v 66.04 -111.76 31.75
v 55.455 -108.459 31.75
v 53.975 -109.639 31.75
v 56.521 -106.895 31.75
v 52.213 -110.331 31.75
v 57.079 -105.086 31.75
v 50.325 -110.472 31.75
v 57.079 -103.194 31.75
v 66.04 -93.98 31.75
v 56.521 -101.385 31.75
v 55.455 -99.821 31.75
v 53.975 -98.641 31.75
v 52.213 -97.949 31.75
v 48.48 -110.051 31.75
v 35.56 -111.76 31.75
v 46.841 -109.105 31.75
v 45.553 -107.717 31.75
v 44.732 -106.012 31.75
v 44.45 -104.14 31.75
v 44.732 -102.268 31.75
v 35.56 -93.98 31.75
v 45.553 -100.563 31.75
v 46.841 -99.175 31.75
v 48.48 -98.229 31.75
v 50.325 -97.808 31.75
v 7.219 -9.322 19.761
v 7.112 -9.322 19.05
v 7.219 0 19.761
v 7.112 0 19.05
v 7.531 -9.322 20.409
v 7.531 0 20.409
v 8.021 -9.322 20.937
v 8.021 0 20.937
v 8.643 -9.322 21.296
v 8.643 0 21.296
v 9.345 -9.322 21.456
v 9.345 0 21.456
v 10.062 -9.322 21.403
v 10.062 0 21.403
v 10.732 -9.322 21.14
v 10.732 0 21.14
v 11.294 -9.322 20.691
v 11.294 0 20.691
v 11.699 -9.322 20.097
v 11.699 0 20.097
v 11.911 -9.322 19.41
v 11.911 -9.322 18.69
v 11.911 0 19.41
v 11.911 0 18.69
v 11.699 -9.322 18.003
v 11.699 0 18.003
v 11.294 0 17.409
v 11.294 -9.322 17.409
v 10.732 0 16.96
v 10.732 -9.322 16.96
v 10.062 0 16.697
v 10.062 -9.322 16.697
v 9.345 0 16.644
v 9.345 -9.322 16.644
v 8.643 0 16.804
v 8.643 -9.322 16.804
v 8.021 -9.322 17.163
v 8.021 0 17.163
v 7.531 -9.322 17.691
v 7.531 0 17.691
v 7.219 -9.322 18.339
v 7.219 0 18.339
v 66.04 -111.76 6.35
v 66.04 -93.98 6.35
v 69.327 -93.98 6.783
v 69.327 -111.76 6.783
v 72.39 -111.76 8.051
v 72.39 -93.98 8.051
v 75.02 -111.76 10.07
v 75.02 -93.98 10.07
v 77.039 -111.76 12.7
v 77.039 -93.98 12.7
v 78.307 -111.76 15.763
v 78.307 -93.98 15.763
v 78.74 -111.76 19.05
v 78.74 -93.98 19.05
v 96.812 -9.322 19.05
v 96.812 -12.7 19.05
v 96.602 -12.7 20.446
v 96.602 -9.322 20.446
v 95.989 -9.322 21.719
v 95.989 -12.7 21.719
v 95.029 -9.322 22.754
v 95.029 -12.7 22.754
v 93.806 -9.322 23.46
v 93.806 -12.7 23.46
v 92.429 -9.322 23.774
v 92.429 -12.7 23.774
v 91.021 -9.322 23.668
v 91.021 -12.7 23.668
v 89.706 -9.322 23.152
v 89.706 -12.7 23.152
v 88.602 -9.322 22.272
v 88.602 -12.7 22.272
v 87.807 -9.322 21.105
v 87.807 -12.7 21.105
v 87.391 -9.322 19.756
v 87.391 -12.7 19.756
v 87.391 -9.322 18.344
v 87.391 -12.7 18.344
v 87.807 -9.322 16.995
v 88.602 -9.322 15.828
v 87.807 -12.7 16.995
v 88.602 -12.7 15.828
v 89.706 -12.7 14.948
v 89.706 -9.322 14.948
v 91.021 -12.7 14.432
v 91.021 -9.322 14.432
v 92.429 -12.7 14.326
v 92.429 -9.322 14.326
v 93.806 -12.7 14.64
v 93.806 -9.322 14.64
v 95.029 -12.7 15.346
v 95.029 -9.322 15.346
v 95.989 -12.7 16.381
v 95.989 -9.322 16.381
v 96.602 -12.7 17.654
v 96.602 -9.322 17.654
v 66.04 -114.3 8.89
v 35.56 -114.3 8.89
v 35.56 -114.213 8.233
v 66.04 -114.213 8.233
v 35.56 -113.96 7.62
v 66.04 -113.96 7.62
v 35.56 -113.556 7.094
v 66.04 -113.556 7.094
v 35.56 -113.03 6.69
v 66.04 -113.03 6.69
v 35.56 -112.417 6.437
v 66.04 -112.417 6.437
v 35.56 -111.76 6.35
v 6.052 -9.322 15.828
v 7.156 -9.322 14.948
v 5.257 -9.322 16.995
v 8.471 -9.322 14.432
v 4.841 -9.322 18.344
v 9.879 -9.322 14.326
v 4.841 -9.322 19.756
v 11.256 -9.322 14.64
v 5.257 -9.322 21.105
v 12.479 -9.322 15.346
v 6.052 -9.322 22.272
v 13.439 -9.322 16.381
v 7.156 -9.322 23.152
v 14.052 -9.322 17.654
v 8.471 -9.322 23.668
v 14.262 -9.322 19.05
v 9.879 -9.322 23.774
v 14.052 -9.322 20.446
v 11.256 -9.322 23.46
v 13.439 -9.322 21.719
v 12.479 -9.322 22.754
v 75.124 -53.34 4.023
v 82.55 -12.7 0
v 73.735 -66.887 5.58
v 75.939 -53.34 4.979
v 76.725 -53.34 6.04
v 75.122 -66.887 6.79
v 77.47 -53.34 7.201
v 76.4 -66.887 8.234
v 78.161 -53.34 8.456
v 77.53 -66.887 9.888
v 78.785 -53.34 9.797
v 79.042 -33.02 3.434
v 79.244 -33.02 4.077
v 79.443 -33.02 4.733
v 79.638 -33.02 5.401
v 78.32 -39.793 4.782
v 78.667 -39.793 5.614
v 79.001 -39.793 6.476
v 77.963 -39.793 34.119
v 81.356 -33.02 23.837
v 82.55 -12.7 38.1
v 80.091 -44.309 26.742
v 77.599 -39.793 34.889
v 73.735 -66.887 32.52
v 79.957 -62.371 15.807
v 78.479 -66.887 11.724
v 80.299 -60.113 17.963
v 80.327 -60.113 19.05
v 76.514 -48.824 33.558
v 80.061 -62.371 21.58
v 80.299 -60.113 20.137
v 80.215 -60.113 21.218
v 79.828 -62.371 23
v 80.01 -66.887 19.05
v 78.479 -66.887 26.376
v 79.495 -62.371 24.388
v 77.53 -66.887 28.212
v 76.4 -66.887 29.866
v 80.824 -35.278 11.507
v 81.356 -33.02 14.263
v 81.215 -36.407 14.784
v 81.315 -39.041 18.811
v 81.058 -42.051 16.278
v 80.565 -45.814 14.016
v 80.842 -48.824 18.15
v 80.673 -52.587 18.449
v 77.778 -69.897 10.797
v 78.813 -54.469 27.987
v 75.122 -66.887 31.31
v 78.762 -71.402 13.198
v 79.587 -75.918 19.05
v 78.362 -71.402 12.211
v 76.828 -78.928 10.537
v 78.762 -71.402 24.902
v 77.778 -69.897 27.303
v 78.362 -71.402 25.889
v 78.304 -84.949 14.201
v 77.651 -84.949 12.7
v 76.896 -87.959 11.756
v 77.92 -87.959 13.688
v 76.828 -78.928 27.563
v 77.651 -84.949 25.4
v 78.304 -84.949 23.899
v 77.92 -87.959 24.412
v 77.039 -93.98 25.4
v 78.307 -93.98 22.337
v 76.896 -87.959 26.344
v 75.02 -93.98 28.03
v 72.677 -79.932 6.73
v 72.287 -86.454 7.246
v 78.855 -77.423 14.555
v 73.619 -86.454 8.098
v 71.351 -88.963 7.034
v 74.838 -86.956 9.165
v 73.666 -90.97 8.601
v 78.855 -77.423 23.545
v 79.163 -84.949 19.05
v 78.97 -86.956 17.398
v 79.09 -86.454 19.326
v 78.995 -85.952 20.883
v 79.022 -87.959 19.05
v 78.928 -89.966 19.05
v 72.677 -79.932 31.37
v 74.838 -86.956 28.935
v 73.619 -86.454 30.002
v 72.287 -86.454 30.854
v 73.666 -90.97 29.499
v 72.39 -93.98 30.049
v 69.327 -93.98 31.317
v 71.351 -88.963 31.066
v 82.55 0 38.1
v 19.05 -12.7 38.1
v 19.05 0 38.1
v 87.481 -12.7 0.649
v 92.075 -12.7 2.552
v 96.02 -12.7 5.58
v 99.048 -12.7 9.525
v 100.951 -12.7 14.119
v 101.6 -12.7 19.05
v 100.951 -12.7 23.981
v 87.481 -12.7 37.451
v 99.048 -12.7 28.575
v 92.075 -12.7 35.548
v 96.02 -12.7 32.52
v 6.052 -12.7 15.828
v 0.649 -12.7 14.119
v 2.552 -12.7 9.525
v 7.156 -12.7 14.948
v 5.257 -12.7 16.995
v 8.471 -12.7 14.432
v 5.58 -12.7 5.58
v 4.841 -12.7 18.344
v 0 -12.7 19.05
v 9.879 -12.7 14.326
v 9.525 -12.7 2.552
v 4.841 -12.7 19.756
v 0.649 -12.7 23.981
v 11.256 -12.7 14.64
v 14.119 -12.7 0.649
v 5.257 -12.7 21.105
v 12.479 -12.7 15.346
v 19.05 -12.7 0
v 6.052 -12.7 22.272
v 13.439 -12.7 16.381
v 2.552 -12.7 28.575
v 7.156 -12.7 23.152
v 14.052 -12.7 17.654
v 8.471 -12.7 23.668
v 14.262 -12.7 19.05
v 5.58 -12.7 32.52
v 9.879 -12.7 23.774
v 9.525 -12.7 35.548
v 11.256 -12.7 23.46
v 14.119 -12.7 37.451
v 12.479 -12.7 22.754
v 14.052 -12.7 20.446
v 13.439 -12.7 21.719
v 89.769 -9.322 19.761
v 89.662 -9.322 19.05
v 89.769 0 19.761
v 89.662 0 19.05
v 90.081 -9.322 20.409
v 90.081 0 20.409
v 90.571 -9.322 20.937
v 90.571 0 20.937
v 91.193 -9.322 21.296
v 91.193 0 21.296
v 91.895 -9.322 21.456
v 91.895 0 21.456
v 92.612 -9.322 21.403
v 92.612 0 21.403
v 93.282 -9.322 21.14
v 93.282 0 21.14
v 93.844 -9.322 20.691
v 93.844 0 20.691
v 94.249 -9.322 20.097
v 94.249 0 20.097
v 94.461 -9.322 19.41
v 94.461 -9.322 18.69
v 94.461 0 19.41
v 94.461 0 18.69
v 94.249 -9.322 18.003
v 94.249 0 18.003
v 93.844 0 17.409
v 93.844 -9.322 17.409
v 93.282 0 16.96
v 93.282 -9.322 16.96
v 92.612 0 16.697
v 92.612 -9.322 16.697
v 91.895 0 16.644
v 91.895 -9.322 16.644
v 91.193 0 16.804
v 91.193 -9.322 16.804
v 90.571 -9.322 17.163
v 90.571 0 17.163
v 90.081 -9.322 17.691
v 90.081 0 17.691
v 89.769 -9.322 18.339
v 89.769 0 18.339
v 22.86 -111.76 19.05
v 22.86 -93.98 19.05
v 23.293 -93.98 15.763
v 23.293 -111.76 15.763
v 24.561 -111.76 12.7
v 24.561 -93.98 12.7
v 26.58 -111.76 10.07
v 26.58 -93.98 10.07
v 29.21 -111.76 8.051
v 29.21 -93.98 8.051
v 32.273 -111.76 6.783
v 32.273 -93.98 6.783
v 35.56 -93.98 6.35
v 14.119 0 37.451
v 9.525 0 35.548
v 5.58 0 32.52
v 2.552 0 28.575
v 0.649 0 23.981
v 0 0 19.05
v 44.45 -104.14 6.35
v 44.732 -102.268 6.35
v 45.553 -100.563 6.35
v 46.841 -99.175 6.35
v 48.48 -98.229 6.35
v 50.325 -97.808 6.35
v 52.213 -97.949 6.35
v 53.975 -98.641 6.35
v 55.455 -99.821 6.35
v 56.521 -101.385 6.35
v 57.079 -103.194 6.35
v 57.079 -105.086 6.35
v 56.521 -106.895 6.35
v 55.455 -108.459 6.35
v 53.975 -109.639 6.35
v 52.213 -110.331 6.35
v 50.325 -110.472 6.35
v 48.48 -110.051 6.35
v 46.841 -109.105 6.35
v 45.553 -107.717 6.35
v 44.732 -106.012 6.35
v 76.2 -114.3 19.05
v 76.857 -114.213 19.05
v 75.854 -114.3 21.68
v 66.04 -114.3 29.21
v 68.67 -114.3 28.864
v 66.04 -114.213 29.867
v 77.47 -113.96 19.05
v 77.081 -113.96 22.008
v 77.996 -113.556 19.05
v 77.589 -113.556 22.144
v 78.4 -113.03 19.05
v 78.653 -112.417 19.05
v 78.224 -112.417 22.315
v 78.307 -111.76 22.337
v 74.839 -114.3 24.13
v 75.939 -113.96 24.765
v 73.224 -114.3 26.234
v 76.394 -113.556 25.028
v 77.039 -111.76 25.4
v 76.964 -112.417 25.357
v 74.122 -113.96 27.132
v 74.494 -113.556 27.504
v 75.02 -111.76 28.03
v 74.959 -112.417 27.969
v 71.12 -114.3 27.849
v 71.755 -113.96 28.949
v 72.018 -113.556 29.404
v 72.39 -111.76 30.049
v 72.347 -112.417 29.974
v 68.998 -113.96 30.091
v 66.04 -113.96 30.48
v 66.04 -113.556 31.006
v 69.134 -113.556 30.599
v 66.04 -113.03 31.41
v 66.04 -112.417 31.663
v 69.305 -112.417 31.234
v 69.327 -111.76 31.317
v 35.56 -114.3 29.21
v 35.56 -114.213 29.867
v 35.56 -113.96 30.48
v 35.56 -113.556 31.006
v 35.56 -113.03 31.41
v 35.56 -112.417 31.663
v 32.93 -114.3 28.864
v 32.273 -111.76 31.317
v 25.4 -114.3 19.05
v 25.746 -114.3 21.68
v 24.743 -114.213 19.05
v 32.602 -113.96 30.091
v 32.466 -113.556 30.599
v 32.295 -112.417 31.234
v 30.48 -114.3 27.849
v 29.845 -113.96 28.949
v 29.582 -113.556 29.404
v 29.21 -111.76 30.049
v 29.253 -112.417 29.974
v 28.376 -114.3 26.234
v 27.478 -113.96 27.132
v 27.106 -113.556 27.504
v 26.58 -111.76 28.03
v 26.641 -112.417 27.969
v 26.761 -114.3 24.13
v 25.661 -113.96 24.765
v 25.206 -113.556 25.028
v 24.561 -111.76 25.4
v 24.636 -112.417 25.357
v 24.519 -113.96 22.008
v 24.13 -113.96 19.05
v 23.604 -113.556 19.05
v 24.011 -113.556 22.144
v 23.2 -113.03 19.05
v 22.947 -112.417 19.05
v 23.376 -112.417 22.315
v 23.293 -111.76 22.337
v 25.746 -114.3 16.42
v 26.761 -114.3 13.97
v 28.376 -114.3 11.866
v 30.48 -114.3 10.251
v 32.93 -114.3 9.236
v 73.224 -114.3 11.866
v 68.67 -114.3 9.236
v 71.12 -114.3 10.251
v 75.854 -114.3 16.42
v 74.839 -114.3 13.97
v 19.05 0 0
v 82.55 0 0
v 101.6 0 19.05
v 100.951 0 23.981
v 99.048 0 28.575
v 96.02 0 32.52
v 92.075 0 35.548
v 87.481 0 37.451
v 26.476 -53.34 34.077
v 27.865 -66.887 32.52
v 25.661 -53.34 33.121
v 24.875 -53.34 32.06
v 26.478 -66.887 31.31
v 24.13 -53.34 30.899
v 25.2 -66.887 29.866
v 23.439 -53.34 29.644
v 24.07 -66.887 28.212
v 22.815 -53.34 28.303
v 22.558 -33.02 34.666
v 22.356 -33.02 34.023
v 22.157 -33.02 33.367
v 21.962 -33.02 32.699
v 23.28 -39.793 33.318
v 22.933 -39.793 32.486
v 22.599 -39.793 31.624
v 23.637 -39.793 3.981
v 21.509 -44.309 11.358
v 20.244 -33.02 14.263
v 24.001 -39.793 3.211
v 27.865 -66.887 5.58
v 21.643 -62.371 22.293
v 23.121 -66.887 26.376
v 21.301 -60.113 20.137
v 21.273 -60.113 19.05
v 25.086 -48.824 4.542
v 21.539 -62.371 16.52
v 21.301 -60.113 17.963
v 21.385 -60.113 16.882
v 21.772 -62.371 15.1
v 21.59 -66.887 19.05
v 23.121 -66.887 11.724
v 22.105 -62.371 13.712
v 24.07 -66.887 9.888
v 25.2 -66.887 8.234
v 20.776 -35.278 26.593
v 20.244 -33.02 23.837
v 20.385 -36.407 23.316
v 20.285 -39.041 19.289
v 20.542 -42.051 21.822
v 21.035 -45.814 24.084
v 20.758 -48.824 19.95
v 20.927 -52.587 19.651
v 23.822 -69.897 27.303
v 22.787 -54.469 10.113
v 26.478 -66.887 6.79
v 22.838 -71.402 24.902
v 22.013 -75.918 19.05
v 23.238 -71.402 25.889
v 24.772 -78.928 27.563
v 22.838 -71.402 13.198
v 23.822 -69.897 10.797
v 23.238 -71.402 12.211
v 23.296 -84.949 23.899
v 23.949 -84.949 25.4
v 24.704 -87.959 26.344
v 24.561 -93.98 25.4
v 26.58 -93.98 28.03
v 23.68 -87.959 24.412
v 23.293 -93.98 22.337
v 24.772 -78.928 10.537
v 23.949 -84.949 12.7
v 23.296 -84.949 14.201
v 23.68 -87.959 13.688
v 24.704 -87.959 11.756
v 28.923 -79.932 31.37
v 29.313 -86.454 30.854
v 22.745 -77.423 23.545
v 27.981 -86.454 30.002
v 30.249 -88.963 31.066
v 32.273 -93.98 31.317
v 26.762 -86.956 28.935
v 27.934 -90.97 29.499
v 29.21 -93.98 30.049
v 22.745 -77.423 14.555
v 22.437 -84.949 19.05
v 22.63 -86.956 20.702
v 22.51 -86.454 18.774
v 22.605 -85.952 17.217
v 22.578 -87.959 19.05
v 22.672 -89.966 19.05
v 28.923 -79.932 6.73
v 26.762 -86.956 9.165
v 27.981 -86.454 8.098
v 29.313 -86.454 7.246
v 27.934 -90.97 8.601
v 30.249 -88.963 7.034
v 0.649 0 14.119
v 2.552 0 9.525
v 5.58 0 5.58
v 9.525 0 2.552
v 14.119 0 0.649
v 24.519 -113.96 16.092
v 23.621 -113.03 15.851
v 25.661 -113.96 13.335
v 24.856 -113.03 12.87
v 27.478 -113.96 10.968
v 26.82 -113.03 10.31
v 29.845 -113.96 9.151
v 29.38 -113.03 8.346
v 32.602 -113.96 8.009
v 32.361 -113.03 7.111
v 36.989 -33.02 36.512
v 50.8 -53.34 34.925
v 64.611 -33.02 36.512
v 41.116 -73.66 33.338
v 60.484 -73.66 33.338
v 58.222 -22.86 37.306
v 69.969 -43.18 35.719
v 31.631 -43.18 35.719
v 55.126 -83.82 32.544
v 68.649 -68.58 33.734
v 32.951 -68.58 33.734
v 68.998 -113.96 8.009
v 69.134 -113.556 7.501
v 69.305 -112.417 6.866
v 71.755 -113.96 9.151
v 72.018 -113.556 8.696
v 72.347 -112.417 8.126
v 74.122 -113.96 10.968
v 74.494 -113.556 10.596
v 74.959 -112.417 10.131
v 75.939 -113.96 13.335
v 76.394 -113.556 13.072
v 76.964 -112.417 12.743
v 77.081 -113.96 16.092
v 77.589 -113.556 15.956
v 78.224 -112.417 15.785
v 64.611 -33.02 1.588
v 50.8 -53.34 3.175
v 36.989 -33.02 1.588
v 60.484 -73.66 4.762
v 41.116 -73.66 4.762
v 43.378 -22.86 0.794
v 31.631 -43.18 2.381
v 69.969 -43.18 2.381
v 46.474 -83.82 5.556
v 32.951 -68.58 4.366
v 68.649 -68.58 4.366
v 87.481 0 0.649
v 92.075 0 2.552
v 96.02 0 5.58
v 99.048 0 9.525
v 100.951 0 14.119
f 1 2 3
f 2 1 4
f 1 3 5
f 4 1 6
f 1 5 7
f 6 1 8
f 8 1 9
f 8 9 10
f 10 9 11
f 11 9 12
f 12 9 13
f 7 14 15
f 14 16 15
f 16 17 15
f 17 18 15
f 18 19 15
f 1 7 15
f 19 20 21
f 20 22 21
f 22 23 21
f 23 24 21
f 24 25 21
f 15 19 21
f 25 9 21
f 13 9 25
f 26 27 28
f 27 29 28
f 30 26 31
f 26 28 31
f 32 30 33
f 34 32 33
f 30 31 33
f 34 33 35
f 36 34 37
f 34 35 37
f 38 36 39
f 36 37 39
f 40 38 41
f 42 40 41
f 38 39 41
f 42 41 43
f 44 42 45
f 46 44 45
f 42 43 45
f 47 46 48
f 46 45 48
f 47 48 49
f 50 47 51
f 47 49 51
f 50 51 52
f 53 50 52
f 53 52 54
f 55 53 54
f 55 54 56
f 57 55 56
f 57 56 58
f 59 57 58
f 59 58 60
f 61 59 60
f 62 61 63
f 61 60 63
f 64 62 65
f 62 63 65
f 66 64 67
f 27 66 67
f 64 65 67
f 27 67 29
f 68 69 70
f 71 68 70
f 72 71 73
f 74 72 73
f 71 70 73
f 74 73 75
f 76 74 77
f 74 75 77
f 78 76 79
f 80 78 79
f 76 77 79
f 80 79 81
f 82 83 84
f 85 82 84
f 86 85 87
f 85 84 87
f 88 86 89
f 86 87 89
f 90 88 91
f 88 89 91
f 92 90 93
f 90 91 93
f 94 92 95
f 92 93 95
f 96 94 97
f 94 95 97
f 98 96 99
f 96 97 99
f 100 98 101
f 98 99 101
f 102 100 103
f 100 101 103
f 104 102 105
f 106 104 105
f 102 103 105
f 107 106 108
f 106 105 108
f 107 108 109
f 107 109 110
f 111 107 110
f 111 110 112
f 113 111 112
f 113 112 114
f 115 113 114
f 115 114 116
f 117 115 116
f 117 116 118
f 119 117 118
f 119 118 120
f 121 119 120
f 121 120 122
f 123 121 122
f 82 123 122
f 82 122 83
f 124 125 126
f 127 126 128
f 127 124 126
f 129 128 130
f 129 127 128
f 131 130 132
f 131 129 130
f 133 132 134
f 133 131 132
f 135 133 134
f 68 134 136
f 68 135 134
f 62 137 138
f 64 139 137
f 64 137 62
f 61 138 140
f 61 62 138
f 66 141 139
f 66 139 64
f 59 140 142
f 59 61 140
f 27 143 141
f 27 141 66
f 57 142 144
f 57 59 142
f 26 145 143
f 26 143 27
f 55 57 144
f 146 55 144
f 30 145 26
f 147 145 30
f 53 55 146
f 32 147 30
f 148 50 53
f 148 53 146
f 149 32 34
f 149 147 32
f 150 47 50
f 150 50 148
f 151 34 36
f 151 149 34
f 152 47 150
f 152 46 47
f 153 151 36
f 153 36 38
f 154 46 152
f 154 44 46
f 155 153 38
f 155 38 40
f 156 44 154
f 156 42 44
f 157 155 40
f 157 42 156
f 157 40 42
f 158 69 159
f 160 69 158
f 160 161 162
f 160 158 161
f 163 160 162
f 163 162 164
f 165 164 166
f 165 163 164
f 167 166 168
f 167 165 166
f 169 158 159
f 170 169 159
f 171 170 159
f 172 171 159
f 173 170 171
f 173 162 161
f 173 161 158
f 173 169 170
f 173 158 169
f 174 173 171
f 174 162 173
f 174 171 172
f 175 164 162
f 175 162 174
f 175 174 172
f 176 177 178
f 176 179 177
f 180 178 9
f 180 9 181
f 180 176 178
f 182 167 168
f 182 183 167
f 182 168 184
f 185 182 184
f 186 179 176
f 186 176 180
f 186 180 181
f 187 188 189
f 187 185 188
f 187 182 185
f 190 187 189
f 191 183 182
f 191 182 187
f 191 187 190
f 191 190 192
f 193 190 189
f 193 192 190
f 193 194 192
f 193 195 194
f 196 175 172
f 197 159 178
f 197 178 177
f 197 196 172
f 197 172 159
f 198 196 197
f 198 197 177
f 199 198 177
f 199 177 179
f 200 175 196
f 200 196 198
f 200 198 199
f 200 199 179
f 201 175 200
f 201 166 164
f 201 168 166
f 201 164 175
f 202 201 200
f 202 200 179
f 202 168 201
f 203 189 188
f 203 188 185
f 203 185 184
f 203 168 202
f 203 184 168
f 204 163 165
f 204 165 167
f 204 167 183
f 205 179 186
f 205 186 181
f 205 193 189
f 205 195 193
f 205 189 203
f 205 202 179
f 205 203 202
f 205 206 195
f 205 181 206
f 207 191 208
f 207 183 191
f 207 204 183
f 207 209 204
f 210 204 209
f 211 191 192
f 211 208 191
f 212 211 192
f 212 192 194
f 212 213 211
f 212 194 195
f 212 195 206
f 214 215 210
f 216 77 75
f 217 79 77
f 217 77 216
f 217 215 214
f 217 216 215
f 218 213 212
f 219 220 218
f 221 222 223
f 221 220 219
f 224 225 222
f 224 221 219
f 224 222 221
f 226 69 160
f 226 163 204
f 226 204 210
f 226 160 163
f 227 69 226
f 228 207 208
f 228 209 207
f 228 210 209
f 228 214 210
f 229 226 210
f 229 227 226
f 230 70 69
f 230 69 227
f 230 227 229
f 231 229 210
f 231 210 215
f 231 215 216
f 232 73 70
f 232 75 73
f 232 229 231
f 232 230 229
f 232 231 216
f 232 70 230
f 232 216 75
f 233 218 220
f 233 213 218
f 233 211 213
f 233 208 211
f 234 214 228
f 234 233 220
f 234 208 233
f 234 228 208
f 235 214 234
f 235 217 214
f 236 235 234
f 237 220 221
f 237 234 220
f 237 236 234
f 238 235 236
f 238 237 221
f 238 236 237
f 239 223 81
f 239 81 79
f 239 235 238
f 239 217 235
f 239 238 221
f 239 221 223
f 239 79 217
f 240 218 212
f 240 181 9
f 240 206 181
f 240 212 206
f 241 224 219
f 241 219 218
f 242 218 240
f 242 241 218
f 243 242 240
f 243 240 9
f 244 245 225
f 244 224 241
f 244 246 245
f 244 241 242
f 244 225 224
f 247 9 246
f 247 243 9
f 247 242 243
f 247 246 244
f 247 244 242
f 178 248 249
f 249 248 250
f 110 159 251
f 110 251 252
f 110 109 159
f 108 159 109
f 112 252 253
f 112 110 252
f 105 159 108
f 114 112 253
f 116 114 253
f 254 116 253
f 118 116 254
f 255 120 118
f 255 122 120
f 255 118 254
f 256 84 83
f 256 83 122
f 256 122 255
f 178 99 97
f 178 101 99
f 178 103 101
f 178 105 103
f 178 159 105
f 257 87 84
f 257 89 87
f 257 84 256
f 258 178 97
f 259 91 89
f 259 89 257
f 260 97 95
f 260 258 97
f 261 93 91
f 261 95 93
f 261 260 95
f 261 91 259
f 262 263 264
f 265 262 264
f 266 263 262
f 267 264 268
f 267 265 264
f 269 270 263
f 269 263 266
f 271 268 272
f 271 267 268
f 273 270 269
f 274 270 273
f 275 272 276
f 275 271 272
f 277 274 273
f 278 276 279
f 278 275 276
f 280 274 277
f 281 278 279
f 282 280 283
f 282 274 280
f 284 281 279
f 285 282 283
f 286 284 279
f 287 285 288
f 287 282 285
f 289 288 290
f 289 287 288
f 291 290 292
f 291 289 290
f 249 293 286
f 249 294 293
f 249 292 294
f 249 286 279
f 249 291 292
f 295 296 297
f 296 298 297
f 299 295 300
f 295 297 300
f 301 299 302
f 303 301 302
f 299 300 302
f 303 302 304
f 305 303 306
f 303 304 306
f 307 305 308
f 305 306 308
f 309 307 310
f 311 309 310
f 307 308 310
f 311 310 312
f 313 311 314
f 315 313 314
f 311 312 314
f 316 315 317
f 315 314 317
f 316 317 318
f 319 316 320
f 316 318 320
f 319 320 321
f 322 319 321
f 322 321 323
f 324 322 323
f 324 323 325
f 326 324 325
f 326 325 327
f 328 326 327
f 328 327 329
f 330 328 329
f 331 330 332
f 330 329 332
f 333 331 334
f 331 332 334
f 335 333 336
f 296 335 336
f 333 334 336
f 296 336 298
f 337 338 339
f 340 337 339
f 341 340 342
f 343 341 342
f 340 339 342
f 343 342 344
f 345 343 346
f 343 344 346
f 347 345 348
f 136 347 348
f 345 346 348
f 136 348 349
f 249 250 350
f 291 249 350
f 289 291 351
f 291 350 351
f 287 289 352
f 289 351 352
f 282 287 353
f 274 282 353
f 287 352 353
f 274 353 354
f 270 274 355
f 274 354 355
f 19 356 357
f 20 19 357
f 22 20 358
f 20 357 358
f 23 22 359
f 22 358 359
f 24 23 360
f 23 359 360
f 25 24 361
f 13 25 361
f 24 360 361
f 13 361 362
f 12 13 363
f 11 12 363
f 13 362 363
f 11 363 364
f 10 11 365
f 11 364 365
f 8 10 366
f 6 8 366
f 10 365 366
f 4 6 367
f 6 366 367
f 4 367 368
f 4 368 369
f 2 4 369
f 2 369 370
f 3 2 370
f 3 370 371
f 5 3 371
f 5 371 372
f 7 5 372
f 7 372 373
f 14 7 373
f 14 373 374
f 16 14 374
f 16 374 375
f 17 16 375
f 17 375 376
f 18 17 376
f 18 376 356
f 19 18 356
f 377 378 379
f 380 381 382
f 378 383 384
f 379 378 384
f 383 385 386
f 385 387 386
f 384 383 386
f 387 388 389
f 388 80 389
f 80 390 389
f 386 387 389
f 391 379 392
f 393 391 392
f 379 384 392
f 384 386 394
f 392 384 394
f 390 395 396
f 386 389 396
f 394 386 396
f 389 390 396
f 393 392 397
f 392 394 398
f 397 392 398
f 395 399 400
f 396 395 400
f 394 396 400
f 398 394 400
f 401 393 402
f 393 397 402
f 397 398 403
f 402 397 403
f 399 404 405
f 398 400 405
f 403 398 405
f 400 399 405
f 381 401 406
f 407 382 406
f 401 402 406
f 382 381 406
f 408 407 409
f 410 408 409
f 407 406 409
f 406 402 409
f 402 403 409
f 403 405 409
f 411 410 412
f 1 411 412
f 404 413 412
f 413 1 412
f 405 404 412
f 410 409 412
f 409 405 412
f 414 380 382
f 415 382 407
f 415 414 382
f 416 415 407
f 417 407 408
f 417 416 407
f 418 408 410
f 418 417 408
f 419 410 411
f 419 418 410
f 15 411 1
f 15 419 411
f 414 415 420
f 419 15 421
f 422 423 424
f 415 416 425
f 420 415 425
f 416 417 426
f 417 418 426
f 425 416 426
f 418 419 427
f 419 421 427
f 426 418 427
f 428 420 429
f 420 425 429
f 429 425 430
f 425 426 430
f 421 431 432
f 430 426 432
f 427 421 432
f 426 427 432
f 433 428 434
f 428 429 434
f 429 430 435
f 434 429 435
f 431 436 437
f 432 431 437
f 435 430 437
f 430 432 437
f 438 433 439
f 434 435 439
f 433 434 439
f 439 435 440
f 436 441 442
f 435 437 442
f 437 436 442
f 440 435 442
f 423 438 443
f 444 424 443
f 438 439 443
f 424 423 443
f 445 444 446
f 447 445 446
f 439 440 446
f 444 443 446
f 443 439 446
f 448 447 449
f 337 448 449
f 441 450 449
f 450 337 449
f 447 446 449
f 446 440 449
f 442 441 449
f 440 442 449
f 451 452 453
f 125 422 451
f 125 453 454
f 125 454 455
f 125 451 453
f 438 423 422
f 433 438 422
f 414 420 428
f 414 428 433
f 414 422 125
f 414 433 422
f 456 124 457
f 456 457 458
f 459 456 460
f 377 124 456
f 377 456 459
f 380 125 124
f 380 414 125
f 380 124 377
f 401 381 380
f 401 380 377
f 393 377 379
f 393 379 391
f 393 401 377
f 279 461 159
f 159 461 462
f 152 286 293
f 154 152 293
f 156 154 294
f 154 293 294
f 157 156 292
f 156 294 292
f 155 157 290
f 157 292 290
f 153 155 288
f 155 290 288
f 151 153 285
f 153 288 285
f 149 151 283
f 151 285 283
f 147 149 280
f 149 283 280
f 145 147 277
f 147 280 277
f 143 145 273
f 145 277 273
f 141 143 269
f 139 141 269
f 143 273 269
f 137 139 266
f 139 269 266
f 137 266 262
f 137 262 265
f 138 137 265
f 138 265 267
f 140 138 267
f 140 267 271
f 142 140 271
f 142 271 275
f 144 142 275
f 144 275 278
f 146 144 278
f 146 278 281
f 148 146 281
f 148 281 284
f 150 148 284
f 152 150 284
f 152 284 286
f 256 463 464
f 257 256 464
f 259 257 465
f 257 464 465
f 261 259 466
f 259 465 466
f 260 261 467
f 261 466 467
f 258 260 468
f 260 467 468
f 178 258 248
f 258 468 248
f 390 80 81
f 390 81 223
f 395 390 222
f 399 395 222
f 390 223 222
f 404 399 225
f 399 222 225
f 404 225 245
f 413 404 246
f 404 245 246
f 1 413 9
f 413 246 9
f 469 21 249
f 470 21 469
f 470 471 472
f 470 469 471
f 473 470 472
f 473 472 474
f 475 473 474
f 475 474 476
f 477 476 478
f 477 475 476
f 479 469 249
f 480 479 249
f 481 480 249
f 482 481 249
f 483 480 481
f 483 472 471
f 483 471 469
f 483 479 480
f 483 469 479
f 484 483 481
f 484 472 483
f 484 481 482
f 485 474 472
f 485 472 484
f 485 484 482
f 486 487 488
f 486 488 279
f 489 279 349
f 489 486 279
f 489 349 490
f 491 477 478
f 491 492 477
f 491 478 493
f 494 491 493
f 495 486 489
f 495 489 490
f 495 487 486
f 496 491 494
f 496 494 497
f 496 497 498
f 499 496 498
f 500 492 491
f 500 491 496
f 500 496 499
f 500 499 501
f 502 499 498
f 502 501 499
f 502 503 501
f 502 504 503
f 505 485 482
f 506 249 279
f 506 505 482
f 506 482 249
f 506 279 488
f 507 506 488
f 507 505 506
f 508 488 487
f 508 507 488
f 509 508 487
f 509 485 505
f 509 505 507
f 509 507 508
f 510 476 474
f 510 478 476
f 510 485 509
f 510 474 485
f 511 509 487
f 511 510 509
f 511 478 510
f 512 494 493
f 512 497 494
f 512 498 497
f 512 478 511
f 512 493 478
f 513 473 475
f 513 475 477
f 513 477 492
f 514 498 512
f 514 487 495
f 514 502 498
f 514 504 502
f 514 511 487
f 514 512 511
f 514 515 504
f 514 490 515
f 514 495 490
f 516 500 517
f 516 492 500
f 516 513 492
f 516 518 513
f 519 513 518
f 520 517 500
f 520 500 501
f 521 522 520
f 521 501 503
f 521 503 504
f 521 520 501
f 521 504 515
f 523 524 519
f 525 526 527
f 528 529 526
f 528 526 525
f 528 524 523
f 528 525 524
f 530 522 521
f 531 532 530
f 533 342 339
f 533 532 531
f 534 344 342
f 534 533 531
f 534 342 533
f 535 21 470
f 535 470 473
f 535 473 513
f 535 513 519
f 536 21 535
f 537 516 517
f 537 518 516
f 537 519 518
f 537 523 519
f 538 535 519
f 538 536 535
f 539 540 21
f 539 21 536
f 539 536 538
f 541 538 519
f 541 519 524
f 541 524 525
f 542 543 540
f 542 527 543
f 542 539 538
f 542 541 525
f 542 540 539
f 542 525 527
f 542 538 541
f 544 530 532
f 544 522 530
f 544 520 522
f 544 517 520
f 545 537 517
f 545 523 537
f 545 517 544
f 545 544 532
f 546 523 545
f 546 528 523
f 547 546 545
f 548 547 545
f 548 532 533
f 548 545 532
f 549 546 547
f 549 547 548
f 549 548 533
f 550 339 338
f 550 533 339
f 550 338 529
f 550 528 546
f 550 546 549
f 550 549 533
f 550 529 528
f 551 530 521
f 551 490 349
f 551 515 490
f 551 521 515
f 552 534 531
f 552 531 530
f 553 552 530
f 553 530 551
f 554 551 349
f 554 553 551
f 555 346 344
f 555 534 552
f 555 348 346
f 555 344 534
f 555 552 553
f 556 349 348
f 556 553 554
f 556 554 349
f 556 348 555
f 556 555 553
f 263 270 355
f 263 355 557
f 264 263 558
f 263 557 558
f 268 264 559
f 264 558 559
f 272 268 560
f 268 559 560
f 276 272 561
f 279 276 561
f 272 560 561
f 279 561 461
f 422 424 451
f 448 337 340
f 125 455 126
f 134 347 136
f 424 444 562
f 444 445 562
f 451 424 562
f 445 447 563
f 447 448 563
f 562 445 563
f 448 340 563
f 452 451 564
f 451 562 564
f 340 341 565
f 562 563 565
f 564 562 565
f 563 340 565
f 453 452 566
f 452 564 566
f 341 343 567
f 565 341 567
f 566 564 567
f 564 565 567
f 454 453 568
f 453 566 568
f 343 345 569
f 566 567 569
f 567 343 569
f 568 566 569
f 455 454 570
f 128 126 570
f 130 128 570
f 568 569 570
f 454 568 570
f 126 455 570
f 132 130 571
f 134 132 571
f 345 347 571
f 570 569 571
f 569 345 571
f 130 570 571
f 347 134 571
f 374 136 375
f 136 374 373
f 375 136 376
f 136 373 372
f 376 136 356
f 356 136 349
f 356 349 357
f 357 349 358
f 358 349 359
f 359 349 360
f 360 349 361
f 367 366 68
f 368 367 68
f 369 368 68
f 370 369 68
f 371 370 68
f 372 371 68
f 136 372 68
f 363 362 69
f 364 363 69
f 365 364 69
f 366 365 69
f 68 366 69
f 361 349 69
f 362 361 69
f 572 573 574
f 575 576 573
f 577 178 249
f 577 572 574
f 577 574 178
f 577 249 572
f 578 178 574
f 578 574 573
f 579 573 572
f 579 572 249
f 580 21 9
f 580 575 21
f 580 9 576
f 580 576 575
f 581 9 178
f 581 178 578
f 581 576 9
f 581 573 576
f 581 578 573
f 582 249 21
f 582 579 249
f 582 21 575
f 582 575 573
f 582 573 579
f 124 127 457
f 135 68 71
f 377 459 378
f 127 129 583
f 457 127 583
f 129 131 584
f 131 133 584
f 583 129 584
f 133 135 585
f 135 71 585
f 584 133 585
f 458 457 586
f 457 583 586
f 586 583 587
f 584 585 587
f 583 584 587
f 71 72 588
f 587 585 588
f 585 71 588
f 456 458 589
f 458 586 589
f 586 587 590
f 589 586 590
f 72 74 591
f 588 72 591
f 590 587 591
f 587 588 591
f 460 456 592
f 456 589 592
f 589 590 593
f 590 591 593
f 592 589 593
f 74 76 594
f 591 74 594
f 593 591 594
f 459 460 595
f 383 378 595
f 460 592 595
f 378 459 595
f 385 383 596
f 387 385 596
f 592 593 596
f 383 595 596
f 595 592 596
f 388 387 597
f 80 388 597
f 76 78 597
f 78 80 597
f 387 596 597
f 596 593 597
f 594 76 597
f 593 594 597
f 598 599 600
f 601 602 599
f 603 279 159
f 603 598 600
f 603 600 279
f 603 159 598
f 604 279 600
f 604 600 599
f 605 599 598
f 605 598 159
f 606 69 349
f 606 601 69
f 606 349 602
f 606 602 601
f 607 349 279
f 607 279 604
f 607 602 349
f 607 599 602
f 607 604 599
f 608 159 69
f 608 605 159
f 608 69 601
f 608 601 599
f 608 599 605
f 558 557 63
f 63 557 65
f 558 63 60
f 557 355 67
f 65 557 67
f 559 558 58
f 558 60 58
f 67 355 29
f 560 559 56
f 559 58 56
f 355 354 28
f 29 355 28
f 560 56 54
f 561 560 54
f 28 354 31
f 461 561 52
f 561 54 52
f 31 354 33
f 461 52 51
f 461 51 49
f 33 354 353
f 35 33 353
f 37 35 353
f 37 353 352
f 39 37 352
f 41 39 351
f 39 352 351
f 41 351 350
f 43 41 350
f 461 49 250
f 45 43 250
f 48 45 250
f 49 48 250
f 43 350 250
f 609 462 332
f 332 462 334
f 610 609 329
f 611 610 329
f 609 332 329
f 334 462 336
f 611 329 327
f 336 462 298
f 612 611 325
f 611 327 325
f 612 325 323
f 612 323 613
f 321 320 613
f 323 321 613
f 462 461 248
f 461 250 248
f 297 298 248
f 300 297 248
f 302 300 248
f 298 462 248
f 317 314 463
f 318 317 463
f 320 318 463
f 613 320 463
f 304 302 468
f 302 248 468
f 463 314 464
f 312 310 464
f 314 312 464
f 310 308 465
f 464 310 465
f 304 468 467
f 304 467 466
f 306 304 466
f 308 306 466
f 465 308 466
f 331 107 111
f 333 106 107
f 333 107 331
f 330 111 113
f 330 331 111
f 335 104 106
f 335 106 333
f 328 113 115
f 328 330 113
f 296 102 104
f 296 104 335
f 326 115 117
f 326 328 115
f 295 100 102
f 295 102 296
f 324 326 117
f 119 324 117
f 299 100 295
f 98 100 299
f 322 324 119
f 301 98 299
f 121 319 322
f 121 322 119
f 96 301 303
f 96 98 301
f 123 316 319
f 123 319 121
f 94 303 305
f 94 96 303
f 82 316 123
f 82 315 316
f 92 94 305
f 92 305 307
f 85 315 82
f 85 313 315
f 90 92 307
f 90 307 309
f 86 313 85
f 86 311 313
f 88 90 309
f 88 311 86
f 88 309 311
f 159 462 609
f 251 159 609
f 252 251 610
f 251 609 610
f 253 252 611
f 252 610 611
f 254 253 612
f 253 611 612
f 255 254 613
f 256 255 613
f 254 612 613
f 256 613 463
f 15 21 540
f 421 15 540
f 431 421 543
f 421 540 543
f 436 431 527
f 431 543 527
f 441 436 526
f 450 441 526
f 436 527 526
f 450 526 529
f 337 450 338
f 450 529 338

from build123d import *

# Parameters (mm, degrees)
F1_DEPTH        = 12.7
F5_DEPTH        = 20.32
F4_W            = 63.5
F4_H            = 38.1
F9_D            = 12.7
F11_D           = 4.826
F11_CBORE_D     = 9.4742
F11_CBORE_DEPTH = 3.3782
F12_R           = 2.54


with BuildPart() as f1:
    # F0 (on Front) → F1 (new body)
    with BuildSketch(Plane.XZ):
        with BuildLine():
            ThreePointArc((0, 19.05), (5.5796158184, 5.5796158184), (19.05, 0))
            Line((19.05, 0), (82.55, 0))
            ThreePointArc((82.55, 0), (96.0203841816, 5.5796158184), (101.6, 19.05))
            ThreePointArc((101.6, 19.05), (96.0203841816, 32.5203841816), (82.55, 38.1))
            Line((82.55, 38.1), (19.05, 38.1))
            ThreePointArc((19.05, 38.1), (5.5796158184, 32.5203841816), (0, 19.05))
        make_face()
    extrude(amount=F1_DEPTH)


with BuildPart() as f5:
    # F3 (on offset) → F5 (new body)
    with BuildSketch(Plane.XZ.offset(93.98)):
        with BuildLine():
            ThreePointArc((22.86, 19.05), (26.5797438789, 10.0697438789), (35.56, 6.35))
            Line((35.56, 6.35), (66.04, 6.35))
            ThreePointArc((66.04, 6.35), (75.0202561211, 10.0697438789), (78.74, 19.05))
            ThreePointArc((78.74, 19.05), (75.0202561211, 28.0302561211), (66.04, 31.75))
            Line((66.04, 31.75), (35.56, 31.75))
            ThreePointArc((35.56, 31.75), (26.5797438789, 28.0302561211), (22.86, 19.05))
        make_face()
    extrude(amount=F5_DEPTH)


with BuildPart() as f6:
    # F4 (on face) → F6 section 0
    with BuildSketch(Plane.XZ.offset(12.7)):
        with Locations((50.8, 19.05)):
            Rectangle(F4_W, F4_H)
    # F5_face (on face) → F6 section 1
    with BuildSketch(Plane(origin=(50.8, -93.98, 19.05), x_dir=(1, 0, 0), z_dir=(0, 1, 0))):
        with BuildLine():
            ThreePointArc((-15.24, 12.7), (-27.94, 0), (-15.24, -12.7))
            Line((-15.24, -12.7), (15.24, -12.7))
            ThreePointArc((15.24, -12.7), (27.94, 0), (15.24, 12.7))
            Line((15.24, 12.7), (-15.24, 12.7))
        make_face()
    loft()


with BuildPart() as f1_1:
    add(f1.part)

    # F7: union F5, F6
    add(f5.part)
    add(f6.part)

    # F9 (through all)
    with Locations(Plane.XY.offset(31.75)):
        with Locations((50.8, -104.14)):
            Hole(F9_D / 2)

    # F11 (through all)
    with Locations(Plane.XZ.offset(12.7)):
        with Locations((9.525, 19.05), (92.075, 19.05)):
            CounterBoreHole(F11_D / 2, F11_CBORE_D / 2, F11_CBORE_DEPTH)

    # F12
    f12_edges = [f1_1.edges().sort_by_distance(p)[0] for p in [
        (50.8, -114.3, 31.75),
    ]]
    fillet(f12_edges, radius=F12_R)


solid = f1_1.part
